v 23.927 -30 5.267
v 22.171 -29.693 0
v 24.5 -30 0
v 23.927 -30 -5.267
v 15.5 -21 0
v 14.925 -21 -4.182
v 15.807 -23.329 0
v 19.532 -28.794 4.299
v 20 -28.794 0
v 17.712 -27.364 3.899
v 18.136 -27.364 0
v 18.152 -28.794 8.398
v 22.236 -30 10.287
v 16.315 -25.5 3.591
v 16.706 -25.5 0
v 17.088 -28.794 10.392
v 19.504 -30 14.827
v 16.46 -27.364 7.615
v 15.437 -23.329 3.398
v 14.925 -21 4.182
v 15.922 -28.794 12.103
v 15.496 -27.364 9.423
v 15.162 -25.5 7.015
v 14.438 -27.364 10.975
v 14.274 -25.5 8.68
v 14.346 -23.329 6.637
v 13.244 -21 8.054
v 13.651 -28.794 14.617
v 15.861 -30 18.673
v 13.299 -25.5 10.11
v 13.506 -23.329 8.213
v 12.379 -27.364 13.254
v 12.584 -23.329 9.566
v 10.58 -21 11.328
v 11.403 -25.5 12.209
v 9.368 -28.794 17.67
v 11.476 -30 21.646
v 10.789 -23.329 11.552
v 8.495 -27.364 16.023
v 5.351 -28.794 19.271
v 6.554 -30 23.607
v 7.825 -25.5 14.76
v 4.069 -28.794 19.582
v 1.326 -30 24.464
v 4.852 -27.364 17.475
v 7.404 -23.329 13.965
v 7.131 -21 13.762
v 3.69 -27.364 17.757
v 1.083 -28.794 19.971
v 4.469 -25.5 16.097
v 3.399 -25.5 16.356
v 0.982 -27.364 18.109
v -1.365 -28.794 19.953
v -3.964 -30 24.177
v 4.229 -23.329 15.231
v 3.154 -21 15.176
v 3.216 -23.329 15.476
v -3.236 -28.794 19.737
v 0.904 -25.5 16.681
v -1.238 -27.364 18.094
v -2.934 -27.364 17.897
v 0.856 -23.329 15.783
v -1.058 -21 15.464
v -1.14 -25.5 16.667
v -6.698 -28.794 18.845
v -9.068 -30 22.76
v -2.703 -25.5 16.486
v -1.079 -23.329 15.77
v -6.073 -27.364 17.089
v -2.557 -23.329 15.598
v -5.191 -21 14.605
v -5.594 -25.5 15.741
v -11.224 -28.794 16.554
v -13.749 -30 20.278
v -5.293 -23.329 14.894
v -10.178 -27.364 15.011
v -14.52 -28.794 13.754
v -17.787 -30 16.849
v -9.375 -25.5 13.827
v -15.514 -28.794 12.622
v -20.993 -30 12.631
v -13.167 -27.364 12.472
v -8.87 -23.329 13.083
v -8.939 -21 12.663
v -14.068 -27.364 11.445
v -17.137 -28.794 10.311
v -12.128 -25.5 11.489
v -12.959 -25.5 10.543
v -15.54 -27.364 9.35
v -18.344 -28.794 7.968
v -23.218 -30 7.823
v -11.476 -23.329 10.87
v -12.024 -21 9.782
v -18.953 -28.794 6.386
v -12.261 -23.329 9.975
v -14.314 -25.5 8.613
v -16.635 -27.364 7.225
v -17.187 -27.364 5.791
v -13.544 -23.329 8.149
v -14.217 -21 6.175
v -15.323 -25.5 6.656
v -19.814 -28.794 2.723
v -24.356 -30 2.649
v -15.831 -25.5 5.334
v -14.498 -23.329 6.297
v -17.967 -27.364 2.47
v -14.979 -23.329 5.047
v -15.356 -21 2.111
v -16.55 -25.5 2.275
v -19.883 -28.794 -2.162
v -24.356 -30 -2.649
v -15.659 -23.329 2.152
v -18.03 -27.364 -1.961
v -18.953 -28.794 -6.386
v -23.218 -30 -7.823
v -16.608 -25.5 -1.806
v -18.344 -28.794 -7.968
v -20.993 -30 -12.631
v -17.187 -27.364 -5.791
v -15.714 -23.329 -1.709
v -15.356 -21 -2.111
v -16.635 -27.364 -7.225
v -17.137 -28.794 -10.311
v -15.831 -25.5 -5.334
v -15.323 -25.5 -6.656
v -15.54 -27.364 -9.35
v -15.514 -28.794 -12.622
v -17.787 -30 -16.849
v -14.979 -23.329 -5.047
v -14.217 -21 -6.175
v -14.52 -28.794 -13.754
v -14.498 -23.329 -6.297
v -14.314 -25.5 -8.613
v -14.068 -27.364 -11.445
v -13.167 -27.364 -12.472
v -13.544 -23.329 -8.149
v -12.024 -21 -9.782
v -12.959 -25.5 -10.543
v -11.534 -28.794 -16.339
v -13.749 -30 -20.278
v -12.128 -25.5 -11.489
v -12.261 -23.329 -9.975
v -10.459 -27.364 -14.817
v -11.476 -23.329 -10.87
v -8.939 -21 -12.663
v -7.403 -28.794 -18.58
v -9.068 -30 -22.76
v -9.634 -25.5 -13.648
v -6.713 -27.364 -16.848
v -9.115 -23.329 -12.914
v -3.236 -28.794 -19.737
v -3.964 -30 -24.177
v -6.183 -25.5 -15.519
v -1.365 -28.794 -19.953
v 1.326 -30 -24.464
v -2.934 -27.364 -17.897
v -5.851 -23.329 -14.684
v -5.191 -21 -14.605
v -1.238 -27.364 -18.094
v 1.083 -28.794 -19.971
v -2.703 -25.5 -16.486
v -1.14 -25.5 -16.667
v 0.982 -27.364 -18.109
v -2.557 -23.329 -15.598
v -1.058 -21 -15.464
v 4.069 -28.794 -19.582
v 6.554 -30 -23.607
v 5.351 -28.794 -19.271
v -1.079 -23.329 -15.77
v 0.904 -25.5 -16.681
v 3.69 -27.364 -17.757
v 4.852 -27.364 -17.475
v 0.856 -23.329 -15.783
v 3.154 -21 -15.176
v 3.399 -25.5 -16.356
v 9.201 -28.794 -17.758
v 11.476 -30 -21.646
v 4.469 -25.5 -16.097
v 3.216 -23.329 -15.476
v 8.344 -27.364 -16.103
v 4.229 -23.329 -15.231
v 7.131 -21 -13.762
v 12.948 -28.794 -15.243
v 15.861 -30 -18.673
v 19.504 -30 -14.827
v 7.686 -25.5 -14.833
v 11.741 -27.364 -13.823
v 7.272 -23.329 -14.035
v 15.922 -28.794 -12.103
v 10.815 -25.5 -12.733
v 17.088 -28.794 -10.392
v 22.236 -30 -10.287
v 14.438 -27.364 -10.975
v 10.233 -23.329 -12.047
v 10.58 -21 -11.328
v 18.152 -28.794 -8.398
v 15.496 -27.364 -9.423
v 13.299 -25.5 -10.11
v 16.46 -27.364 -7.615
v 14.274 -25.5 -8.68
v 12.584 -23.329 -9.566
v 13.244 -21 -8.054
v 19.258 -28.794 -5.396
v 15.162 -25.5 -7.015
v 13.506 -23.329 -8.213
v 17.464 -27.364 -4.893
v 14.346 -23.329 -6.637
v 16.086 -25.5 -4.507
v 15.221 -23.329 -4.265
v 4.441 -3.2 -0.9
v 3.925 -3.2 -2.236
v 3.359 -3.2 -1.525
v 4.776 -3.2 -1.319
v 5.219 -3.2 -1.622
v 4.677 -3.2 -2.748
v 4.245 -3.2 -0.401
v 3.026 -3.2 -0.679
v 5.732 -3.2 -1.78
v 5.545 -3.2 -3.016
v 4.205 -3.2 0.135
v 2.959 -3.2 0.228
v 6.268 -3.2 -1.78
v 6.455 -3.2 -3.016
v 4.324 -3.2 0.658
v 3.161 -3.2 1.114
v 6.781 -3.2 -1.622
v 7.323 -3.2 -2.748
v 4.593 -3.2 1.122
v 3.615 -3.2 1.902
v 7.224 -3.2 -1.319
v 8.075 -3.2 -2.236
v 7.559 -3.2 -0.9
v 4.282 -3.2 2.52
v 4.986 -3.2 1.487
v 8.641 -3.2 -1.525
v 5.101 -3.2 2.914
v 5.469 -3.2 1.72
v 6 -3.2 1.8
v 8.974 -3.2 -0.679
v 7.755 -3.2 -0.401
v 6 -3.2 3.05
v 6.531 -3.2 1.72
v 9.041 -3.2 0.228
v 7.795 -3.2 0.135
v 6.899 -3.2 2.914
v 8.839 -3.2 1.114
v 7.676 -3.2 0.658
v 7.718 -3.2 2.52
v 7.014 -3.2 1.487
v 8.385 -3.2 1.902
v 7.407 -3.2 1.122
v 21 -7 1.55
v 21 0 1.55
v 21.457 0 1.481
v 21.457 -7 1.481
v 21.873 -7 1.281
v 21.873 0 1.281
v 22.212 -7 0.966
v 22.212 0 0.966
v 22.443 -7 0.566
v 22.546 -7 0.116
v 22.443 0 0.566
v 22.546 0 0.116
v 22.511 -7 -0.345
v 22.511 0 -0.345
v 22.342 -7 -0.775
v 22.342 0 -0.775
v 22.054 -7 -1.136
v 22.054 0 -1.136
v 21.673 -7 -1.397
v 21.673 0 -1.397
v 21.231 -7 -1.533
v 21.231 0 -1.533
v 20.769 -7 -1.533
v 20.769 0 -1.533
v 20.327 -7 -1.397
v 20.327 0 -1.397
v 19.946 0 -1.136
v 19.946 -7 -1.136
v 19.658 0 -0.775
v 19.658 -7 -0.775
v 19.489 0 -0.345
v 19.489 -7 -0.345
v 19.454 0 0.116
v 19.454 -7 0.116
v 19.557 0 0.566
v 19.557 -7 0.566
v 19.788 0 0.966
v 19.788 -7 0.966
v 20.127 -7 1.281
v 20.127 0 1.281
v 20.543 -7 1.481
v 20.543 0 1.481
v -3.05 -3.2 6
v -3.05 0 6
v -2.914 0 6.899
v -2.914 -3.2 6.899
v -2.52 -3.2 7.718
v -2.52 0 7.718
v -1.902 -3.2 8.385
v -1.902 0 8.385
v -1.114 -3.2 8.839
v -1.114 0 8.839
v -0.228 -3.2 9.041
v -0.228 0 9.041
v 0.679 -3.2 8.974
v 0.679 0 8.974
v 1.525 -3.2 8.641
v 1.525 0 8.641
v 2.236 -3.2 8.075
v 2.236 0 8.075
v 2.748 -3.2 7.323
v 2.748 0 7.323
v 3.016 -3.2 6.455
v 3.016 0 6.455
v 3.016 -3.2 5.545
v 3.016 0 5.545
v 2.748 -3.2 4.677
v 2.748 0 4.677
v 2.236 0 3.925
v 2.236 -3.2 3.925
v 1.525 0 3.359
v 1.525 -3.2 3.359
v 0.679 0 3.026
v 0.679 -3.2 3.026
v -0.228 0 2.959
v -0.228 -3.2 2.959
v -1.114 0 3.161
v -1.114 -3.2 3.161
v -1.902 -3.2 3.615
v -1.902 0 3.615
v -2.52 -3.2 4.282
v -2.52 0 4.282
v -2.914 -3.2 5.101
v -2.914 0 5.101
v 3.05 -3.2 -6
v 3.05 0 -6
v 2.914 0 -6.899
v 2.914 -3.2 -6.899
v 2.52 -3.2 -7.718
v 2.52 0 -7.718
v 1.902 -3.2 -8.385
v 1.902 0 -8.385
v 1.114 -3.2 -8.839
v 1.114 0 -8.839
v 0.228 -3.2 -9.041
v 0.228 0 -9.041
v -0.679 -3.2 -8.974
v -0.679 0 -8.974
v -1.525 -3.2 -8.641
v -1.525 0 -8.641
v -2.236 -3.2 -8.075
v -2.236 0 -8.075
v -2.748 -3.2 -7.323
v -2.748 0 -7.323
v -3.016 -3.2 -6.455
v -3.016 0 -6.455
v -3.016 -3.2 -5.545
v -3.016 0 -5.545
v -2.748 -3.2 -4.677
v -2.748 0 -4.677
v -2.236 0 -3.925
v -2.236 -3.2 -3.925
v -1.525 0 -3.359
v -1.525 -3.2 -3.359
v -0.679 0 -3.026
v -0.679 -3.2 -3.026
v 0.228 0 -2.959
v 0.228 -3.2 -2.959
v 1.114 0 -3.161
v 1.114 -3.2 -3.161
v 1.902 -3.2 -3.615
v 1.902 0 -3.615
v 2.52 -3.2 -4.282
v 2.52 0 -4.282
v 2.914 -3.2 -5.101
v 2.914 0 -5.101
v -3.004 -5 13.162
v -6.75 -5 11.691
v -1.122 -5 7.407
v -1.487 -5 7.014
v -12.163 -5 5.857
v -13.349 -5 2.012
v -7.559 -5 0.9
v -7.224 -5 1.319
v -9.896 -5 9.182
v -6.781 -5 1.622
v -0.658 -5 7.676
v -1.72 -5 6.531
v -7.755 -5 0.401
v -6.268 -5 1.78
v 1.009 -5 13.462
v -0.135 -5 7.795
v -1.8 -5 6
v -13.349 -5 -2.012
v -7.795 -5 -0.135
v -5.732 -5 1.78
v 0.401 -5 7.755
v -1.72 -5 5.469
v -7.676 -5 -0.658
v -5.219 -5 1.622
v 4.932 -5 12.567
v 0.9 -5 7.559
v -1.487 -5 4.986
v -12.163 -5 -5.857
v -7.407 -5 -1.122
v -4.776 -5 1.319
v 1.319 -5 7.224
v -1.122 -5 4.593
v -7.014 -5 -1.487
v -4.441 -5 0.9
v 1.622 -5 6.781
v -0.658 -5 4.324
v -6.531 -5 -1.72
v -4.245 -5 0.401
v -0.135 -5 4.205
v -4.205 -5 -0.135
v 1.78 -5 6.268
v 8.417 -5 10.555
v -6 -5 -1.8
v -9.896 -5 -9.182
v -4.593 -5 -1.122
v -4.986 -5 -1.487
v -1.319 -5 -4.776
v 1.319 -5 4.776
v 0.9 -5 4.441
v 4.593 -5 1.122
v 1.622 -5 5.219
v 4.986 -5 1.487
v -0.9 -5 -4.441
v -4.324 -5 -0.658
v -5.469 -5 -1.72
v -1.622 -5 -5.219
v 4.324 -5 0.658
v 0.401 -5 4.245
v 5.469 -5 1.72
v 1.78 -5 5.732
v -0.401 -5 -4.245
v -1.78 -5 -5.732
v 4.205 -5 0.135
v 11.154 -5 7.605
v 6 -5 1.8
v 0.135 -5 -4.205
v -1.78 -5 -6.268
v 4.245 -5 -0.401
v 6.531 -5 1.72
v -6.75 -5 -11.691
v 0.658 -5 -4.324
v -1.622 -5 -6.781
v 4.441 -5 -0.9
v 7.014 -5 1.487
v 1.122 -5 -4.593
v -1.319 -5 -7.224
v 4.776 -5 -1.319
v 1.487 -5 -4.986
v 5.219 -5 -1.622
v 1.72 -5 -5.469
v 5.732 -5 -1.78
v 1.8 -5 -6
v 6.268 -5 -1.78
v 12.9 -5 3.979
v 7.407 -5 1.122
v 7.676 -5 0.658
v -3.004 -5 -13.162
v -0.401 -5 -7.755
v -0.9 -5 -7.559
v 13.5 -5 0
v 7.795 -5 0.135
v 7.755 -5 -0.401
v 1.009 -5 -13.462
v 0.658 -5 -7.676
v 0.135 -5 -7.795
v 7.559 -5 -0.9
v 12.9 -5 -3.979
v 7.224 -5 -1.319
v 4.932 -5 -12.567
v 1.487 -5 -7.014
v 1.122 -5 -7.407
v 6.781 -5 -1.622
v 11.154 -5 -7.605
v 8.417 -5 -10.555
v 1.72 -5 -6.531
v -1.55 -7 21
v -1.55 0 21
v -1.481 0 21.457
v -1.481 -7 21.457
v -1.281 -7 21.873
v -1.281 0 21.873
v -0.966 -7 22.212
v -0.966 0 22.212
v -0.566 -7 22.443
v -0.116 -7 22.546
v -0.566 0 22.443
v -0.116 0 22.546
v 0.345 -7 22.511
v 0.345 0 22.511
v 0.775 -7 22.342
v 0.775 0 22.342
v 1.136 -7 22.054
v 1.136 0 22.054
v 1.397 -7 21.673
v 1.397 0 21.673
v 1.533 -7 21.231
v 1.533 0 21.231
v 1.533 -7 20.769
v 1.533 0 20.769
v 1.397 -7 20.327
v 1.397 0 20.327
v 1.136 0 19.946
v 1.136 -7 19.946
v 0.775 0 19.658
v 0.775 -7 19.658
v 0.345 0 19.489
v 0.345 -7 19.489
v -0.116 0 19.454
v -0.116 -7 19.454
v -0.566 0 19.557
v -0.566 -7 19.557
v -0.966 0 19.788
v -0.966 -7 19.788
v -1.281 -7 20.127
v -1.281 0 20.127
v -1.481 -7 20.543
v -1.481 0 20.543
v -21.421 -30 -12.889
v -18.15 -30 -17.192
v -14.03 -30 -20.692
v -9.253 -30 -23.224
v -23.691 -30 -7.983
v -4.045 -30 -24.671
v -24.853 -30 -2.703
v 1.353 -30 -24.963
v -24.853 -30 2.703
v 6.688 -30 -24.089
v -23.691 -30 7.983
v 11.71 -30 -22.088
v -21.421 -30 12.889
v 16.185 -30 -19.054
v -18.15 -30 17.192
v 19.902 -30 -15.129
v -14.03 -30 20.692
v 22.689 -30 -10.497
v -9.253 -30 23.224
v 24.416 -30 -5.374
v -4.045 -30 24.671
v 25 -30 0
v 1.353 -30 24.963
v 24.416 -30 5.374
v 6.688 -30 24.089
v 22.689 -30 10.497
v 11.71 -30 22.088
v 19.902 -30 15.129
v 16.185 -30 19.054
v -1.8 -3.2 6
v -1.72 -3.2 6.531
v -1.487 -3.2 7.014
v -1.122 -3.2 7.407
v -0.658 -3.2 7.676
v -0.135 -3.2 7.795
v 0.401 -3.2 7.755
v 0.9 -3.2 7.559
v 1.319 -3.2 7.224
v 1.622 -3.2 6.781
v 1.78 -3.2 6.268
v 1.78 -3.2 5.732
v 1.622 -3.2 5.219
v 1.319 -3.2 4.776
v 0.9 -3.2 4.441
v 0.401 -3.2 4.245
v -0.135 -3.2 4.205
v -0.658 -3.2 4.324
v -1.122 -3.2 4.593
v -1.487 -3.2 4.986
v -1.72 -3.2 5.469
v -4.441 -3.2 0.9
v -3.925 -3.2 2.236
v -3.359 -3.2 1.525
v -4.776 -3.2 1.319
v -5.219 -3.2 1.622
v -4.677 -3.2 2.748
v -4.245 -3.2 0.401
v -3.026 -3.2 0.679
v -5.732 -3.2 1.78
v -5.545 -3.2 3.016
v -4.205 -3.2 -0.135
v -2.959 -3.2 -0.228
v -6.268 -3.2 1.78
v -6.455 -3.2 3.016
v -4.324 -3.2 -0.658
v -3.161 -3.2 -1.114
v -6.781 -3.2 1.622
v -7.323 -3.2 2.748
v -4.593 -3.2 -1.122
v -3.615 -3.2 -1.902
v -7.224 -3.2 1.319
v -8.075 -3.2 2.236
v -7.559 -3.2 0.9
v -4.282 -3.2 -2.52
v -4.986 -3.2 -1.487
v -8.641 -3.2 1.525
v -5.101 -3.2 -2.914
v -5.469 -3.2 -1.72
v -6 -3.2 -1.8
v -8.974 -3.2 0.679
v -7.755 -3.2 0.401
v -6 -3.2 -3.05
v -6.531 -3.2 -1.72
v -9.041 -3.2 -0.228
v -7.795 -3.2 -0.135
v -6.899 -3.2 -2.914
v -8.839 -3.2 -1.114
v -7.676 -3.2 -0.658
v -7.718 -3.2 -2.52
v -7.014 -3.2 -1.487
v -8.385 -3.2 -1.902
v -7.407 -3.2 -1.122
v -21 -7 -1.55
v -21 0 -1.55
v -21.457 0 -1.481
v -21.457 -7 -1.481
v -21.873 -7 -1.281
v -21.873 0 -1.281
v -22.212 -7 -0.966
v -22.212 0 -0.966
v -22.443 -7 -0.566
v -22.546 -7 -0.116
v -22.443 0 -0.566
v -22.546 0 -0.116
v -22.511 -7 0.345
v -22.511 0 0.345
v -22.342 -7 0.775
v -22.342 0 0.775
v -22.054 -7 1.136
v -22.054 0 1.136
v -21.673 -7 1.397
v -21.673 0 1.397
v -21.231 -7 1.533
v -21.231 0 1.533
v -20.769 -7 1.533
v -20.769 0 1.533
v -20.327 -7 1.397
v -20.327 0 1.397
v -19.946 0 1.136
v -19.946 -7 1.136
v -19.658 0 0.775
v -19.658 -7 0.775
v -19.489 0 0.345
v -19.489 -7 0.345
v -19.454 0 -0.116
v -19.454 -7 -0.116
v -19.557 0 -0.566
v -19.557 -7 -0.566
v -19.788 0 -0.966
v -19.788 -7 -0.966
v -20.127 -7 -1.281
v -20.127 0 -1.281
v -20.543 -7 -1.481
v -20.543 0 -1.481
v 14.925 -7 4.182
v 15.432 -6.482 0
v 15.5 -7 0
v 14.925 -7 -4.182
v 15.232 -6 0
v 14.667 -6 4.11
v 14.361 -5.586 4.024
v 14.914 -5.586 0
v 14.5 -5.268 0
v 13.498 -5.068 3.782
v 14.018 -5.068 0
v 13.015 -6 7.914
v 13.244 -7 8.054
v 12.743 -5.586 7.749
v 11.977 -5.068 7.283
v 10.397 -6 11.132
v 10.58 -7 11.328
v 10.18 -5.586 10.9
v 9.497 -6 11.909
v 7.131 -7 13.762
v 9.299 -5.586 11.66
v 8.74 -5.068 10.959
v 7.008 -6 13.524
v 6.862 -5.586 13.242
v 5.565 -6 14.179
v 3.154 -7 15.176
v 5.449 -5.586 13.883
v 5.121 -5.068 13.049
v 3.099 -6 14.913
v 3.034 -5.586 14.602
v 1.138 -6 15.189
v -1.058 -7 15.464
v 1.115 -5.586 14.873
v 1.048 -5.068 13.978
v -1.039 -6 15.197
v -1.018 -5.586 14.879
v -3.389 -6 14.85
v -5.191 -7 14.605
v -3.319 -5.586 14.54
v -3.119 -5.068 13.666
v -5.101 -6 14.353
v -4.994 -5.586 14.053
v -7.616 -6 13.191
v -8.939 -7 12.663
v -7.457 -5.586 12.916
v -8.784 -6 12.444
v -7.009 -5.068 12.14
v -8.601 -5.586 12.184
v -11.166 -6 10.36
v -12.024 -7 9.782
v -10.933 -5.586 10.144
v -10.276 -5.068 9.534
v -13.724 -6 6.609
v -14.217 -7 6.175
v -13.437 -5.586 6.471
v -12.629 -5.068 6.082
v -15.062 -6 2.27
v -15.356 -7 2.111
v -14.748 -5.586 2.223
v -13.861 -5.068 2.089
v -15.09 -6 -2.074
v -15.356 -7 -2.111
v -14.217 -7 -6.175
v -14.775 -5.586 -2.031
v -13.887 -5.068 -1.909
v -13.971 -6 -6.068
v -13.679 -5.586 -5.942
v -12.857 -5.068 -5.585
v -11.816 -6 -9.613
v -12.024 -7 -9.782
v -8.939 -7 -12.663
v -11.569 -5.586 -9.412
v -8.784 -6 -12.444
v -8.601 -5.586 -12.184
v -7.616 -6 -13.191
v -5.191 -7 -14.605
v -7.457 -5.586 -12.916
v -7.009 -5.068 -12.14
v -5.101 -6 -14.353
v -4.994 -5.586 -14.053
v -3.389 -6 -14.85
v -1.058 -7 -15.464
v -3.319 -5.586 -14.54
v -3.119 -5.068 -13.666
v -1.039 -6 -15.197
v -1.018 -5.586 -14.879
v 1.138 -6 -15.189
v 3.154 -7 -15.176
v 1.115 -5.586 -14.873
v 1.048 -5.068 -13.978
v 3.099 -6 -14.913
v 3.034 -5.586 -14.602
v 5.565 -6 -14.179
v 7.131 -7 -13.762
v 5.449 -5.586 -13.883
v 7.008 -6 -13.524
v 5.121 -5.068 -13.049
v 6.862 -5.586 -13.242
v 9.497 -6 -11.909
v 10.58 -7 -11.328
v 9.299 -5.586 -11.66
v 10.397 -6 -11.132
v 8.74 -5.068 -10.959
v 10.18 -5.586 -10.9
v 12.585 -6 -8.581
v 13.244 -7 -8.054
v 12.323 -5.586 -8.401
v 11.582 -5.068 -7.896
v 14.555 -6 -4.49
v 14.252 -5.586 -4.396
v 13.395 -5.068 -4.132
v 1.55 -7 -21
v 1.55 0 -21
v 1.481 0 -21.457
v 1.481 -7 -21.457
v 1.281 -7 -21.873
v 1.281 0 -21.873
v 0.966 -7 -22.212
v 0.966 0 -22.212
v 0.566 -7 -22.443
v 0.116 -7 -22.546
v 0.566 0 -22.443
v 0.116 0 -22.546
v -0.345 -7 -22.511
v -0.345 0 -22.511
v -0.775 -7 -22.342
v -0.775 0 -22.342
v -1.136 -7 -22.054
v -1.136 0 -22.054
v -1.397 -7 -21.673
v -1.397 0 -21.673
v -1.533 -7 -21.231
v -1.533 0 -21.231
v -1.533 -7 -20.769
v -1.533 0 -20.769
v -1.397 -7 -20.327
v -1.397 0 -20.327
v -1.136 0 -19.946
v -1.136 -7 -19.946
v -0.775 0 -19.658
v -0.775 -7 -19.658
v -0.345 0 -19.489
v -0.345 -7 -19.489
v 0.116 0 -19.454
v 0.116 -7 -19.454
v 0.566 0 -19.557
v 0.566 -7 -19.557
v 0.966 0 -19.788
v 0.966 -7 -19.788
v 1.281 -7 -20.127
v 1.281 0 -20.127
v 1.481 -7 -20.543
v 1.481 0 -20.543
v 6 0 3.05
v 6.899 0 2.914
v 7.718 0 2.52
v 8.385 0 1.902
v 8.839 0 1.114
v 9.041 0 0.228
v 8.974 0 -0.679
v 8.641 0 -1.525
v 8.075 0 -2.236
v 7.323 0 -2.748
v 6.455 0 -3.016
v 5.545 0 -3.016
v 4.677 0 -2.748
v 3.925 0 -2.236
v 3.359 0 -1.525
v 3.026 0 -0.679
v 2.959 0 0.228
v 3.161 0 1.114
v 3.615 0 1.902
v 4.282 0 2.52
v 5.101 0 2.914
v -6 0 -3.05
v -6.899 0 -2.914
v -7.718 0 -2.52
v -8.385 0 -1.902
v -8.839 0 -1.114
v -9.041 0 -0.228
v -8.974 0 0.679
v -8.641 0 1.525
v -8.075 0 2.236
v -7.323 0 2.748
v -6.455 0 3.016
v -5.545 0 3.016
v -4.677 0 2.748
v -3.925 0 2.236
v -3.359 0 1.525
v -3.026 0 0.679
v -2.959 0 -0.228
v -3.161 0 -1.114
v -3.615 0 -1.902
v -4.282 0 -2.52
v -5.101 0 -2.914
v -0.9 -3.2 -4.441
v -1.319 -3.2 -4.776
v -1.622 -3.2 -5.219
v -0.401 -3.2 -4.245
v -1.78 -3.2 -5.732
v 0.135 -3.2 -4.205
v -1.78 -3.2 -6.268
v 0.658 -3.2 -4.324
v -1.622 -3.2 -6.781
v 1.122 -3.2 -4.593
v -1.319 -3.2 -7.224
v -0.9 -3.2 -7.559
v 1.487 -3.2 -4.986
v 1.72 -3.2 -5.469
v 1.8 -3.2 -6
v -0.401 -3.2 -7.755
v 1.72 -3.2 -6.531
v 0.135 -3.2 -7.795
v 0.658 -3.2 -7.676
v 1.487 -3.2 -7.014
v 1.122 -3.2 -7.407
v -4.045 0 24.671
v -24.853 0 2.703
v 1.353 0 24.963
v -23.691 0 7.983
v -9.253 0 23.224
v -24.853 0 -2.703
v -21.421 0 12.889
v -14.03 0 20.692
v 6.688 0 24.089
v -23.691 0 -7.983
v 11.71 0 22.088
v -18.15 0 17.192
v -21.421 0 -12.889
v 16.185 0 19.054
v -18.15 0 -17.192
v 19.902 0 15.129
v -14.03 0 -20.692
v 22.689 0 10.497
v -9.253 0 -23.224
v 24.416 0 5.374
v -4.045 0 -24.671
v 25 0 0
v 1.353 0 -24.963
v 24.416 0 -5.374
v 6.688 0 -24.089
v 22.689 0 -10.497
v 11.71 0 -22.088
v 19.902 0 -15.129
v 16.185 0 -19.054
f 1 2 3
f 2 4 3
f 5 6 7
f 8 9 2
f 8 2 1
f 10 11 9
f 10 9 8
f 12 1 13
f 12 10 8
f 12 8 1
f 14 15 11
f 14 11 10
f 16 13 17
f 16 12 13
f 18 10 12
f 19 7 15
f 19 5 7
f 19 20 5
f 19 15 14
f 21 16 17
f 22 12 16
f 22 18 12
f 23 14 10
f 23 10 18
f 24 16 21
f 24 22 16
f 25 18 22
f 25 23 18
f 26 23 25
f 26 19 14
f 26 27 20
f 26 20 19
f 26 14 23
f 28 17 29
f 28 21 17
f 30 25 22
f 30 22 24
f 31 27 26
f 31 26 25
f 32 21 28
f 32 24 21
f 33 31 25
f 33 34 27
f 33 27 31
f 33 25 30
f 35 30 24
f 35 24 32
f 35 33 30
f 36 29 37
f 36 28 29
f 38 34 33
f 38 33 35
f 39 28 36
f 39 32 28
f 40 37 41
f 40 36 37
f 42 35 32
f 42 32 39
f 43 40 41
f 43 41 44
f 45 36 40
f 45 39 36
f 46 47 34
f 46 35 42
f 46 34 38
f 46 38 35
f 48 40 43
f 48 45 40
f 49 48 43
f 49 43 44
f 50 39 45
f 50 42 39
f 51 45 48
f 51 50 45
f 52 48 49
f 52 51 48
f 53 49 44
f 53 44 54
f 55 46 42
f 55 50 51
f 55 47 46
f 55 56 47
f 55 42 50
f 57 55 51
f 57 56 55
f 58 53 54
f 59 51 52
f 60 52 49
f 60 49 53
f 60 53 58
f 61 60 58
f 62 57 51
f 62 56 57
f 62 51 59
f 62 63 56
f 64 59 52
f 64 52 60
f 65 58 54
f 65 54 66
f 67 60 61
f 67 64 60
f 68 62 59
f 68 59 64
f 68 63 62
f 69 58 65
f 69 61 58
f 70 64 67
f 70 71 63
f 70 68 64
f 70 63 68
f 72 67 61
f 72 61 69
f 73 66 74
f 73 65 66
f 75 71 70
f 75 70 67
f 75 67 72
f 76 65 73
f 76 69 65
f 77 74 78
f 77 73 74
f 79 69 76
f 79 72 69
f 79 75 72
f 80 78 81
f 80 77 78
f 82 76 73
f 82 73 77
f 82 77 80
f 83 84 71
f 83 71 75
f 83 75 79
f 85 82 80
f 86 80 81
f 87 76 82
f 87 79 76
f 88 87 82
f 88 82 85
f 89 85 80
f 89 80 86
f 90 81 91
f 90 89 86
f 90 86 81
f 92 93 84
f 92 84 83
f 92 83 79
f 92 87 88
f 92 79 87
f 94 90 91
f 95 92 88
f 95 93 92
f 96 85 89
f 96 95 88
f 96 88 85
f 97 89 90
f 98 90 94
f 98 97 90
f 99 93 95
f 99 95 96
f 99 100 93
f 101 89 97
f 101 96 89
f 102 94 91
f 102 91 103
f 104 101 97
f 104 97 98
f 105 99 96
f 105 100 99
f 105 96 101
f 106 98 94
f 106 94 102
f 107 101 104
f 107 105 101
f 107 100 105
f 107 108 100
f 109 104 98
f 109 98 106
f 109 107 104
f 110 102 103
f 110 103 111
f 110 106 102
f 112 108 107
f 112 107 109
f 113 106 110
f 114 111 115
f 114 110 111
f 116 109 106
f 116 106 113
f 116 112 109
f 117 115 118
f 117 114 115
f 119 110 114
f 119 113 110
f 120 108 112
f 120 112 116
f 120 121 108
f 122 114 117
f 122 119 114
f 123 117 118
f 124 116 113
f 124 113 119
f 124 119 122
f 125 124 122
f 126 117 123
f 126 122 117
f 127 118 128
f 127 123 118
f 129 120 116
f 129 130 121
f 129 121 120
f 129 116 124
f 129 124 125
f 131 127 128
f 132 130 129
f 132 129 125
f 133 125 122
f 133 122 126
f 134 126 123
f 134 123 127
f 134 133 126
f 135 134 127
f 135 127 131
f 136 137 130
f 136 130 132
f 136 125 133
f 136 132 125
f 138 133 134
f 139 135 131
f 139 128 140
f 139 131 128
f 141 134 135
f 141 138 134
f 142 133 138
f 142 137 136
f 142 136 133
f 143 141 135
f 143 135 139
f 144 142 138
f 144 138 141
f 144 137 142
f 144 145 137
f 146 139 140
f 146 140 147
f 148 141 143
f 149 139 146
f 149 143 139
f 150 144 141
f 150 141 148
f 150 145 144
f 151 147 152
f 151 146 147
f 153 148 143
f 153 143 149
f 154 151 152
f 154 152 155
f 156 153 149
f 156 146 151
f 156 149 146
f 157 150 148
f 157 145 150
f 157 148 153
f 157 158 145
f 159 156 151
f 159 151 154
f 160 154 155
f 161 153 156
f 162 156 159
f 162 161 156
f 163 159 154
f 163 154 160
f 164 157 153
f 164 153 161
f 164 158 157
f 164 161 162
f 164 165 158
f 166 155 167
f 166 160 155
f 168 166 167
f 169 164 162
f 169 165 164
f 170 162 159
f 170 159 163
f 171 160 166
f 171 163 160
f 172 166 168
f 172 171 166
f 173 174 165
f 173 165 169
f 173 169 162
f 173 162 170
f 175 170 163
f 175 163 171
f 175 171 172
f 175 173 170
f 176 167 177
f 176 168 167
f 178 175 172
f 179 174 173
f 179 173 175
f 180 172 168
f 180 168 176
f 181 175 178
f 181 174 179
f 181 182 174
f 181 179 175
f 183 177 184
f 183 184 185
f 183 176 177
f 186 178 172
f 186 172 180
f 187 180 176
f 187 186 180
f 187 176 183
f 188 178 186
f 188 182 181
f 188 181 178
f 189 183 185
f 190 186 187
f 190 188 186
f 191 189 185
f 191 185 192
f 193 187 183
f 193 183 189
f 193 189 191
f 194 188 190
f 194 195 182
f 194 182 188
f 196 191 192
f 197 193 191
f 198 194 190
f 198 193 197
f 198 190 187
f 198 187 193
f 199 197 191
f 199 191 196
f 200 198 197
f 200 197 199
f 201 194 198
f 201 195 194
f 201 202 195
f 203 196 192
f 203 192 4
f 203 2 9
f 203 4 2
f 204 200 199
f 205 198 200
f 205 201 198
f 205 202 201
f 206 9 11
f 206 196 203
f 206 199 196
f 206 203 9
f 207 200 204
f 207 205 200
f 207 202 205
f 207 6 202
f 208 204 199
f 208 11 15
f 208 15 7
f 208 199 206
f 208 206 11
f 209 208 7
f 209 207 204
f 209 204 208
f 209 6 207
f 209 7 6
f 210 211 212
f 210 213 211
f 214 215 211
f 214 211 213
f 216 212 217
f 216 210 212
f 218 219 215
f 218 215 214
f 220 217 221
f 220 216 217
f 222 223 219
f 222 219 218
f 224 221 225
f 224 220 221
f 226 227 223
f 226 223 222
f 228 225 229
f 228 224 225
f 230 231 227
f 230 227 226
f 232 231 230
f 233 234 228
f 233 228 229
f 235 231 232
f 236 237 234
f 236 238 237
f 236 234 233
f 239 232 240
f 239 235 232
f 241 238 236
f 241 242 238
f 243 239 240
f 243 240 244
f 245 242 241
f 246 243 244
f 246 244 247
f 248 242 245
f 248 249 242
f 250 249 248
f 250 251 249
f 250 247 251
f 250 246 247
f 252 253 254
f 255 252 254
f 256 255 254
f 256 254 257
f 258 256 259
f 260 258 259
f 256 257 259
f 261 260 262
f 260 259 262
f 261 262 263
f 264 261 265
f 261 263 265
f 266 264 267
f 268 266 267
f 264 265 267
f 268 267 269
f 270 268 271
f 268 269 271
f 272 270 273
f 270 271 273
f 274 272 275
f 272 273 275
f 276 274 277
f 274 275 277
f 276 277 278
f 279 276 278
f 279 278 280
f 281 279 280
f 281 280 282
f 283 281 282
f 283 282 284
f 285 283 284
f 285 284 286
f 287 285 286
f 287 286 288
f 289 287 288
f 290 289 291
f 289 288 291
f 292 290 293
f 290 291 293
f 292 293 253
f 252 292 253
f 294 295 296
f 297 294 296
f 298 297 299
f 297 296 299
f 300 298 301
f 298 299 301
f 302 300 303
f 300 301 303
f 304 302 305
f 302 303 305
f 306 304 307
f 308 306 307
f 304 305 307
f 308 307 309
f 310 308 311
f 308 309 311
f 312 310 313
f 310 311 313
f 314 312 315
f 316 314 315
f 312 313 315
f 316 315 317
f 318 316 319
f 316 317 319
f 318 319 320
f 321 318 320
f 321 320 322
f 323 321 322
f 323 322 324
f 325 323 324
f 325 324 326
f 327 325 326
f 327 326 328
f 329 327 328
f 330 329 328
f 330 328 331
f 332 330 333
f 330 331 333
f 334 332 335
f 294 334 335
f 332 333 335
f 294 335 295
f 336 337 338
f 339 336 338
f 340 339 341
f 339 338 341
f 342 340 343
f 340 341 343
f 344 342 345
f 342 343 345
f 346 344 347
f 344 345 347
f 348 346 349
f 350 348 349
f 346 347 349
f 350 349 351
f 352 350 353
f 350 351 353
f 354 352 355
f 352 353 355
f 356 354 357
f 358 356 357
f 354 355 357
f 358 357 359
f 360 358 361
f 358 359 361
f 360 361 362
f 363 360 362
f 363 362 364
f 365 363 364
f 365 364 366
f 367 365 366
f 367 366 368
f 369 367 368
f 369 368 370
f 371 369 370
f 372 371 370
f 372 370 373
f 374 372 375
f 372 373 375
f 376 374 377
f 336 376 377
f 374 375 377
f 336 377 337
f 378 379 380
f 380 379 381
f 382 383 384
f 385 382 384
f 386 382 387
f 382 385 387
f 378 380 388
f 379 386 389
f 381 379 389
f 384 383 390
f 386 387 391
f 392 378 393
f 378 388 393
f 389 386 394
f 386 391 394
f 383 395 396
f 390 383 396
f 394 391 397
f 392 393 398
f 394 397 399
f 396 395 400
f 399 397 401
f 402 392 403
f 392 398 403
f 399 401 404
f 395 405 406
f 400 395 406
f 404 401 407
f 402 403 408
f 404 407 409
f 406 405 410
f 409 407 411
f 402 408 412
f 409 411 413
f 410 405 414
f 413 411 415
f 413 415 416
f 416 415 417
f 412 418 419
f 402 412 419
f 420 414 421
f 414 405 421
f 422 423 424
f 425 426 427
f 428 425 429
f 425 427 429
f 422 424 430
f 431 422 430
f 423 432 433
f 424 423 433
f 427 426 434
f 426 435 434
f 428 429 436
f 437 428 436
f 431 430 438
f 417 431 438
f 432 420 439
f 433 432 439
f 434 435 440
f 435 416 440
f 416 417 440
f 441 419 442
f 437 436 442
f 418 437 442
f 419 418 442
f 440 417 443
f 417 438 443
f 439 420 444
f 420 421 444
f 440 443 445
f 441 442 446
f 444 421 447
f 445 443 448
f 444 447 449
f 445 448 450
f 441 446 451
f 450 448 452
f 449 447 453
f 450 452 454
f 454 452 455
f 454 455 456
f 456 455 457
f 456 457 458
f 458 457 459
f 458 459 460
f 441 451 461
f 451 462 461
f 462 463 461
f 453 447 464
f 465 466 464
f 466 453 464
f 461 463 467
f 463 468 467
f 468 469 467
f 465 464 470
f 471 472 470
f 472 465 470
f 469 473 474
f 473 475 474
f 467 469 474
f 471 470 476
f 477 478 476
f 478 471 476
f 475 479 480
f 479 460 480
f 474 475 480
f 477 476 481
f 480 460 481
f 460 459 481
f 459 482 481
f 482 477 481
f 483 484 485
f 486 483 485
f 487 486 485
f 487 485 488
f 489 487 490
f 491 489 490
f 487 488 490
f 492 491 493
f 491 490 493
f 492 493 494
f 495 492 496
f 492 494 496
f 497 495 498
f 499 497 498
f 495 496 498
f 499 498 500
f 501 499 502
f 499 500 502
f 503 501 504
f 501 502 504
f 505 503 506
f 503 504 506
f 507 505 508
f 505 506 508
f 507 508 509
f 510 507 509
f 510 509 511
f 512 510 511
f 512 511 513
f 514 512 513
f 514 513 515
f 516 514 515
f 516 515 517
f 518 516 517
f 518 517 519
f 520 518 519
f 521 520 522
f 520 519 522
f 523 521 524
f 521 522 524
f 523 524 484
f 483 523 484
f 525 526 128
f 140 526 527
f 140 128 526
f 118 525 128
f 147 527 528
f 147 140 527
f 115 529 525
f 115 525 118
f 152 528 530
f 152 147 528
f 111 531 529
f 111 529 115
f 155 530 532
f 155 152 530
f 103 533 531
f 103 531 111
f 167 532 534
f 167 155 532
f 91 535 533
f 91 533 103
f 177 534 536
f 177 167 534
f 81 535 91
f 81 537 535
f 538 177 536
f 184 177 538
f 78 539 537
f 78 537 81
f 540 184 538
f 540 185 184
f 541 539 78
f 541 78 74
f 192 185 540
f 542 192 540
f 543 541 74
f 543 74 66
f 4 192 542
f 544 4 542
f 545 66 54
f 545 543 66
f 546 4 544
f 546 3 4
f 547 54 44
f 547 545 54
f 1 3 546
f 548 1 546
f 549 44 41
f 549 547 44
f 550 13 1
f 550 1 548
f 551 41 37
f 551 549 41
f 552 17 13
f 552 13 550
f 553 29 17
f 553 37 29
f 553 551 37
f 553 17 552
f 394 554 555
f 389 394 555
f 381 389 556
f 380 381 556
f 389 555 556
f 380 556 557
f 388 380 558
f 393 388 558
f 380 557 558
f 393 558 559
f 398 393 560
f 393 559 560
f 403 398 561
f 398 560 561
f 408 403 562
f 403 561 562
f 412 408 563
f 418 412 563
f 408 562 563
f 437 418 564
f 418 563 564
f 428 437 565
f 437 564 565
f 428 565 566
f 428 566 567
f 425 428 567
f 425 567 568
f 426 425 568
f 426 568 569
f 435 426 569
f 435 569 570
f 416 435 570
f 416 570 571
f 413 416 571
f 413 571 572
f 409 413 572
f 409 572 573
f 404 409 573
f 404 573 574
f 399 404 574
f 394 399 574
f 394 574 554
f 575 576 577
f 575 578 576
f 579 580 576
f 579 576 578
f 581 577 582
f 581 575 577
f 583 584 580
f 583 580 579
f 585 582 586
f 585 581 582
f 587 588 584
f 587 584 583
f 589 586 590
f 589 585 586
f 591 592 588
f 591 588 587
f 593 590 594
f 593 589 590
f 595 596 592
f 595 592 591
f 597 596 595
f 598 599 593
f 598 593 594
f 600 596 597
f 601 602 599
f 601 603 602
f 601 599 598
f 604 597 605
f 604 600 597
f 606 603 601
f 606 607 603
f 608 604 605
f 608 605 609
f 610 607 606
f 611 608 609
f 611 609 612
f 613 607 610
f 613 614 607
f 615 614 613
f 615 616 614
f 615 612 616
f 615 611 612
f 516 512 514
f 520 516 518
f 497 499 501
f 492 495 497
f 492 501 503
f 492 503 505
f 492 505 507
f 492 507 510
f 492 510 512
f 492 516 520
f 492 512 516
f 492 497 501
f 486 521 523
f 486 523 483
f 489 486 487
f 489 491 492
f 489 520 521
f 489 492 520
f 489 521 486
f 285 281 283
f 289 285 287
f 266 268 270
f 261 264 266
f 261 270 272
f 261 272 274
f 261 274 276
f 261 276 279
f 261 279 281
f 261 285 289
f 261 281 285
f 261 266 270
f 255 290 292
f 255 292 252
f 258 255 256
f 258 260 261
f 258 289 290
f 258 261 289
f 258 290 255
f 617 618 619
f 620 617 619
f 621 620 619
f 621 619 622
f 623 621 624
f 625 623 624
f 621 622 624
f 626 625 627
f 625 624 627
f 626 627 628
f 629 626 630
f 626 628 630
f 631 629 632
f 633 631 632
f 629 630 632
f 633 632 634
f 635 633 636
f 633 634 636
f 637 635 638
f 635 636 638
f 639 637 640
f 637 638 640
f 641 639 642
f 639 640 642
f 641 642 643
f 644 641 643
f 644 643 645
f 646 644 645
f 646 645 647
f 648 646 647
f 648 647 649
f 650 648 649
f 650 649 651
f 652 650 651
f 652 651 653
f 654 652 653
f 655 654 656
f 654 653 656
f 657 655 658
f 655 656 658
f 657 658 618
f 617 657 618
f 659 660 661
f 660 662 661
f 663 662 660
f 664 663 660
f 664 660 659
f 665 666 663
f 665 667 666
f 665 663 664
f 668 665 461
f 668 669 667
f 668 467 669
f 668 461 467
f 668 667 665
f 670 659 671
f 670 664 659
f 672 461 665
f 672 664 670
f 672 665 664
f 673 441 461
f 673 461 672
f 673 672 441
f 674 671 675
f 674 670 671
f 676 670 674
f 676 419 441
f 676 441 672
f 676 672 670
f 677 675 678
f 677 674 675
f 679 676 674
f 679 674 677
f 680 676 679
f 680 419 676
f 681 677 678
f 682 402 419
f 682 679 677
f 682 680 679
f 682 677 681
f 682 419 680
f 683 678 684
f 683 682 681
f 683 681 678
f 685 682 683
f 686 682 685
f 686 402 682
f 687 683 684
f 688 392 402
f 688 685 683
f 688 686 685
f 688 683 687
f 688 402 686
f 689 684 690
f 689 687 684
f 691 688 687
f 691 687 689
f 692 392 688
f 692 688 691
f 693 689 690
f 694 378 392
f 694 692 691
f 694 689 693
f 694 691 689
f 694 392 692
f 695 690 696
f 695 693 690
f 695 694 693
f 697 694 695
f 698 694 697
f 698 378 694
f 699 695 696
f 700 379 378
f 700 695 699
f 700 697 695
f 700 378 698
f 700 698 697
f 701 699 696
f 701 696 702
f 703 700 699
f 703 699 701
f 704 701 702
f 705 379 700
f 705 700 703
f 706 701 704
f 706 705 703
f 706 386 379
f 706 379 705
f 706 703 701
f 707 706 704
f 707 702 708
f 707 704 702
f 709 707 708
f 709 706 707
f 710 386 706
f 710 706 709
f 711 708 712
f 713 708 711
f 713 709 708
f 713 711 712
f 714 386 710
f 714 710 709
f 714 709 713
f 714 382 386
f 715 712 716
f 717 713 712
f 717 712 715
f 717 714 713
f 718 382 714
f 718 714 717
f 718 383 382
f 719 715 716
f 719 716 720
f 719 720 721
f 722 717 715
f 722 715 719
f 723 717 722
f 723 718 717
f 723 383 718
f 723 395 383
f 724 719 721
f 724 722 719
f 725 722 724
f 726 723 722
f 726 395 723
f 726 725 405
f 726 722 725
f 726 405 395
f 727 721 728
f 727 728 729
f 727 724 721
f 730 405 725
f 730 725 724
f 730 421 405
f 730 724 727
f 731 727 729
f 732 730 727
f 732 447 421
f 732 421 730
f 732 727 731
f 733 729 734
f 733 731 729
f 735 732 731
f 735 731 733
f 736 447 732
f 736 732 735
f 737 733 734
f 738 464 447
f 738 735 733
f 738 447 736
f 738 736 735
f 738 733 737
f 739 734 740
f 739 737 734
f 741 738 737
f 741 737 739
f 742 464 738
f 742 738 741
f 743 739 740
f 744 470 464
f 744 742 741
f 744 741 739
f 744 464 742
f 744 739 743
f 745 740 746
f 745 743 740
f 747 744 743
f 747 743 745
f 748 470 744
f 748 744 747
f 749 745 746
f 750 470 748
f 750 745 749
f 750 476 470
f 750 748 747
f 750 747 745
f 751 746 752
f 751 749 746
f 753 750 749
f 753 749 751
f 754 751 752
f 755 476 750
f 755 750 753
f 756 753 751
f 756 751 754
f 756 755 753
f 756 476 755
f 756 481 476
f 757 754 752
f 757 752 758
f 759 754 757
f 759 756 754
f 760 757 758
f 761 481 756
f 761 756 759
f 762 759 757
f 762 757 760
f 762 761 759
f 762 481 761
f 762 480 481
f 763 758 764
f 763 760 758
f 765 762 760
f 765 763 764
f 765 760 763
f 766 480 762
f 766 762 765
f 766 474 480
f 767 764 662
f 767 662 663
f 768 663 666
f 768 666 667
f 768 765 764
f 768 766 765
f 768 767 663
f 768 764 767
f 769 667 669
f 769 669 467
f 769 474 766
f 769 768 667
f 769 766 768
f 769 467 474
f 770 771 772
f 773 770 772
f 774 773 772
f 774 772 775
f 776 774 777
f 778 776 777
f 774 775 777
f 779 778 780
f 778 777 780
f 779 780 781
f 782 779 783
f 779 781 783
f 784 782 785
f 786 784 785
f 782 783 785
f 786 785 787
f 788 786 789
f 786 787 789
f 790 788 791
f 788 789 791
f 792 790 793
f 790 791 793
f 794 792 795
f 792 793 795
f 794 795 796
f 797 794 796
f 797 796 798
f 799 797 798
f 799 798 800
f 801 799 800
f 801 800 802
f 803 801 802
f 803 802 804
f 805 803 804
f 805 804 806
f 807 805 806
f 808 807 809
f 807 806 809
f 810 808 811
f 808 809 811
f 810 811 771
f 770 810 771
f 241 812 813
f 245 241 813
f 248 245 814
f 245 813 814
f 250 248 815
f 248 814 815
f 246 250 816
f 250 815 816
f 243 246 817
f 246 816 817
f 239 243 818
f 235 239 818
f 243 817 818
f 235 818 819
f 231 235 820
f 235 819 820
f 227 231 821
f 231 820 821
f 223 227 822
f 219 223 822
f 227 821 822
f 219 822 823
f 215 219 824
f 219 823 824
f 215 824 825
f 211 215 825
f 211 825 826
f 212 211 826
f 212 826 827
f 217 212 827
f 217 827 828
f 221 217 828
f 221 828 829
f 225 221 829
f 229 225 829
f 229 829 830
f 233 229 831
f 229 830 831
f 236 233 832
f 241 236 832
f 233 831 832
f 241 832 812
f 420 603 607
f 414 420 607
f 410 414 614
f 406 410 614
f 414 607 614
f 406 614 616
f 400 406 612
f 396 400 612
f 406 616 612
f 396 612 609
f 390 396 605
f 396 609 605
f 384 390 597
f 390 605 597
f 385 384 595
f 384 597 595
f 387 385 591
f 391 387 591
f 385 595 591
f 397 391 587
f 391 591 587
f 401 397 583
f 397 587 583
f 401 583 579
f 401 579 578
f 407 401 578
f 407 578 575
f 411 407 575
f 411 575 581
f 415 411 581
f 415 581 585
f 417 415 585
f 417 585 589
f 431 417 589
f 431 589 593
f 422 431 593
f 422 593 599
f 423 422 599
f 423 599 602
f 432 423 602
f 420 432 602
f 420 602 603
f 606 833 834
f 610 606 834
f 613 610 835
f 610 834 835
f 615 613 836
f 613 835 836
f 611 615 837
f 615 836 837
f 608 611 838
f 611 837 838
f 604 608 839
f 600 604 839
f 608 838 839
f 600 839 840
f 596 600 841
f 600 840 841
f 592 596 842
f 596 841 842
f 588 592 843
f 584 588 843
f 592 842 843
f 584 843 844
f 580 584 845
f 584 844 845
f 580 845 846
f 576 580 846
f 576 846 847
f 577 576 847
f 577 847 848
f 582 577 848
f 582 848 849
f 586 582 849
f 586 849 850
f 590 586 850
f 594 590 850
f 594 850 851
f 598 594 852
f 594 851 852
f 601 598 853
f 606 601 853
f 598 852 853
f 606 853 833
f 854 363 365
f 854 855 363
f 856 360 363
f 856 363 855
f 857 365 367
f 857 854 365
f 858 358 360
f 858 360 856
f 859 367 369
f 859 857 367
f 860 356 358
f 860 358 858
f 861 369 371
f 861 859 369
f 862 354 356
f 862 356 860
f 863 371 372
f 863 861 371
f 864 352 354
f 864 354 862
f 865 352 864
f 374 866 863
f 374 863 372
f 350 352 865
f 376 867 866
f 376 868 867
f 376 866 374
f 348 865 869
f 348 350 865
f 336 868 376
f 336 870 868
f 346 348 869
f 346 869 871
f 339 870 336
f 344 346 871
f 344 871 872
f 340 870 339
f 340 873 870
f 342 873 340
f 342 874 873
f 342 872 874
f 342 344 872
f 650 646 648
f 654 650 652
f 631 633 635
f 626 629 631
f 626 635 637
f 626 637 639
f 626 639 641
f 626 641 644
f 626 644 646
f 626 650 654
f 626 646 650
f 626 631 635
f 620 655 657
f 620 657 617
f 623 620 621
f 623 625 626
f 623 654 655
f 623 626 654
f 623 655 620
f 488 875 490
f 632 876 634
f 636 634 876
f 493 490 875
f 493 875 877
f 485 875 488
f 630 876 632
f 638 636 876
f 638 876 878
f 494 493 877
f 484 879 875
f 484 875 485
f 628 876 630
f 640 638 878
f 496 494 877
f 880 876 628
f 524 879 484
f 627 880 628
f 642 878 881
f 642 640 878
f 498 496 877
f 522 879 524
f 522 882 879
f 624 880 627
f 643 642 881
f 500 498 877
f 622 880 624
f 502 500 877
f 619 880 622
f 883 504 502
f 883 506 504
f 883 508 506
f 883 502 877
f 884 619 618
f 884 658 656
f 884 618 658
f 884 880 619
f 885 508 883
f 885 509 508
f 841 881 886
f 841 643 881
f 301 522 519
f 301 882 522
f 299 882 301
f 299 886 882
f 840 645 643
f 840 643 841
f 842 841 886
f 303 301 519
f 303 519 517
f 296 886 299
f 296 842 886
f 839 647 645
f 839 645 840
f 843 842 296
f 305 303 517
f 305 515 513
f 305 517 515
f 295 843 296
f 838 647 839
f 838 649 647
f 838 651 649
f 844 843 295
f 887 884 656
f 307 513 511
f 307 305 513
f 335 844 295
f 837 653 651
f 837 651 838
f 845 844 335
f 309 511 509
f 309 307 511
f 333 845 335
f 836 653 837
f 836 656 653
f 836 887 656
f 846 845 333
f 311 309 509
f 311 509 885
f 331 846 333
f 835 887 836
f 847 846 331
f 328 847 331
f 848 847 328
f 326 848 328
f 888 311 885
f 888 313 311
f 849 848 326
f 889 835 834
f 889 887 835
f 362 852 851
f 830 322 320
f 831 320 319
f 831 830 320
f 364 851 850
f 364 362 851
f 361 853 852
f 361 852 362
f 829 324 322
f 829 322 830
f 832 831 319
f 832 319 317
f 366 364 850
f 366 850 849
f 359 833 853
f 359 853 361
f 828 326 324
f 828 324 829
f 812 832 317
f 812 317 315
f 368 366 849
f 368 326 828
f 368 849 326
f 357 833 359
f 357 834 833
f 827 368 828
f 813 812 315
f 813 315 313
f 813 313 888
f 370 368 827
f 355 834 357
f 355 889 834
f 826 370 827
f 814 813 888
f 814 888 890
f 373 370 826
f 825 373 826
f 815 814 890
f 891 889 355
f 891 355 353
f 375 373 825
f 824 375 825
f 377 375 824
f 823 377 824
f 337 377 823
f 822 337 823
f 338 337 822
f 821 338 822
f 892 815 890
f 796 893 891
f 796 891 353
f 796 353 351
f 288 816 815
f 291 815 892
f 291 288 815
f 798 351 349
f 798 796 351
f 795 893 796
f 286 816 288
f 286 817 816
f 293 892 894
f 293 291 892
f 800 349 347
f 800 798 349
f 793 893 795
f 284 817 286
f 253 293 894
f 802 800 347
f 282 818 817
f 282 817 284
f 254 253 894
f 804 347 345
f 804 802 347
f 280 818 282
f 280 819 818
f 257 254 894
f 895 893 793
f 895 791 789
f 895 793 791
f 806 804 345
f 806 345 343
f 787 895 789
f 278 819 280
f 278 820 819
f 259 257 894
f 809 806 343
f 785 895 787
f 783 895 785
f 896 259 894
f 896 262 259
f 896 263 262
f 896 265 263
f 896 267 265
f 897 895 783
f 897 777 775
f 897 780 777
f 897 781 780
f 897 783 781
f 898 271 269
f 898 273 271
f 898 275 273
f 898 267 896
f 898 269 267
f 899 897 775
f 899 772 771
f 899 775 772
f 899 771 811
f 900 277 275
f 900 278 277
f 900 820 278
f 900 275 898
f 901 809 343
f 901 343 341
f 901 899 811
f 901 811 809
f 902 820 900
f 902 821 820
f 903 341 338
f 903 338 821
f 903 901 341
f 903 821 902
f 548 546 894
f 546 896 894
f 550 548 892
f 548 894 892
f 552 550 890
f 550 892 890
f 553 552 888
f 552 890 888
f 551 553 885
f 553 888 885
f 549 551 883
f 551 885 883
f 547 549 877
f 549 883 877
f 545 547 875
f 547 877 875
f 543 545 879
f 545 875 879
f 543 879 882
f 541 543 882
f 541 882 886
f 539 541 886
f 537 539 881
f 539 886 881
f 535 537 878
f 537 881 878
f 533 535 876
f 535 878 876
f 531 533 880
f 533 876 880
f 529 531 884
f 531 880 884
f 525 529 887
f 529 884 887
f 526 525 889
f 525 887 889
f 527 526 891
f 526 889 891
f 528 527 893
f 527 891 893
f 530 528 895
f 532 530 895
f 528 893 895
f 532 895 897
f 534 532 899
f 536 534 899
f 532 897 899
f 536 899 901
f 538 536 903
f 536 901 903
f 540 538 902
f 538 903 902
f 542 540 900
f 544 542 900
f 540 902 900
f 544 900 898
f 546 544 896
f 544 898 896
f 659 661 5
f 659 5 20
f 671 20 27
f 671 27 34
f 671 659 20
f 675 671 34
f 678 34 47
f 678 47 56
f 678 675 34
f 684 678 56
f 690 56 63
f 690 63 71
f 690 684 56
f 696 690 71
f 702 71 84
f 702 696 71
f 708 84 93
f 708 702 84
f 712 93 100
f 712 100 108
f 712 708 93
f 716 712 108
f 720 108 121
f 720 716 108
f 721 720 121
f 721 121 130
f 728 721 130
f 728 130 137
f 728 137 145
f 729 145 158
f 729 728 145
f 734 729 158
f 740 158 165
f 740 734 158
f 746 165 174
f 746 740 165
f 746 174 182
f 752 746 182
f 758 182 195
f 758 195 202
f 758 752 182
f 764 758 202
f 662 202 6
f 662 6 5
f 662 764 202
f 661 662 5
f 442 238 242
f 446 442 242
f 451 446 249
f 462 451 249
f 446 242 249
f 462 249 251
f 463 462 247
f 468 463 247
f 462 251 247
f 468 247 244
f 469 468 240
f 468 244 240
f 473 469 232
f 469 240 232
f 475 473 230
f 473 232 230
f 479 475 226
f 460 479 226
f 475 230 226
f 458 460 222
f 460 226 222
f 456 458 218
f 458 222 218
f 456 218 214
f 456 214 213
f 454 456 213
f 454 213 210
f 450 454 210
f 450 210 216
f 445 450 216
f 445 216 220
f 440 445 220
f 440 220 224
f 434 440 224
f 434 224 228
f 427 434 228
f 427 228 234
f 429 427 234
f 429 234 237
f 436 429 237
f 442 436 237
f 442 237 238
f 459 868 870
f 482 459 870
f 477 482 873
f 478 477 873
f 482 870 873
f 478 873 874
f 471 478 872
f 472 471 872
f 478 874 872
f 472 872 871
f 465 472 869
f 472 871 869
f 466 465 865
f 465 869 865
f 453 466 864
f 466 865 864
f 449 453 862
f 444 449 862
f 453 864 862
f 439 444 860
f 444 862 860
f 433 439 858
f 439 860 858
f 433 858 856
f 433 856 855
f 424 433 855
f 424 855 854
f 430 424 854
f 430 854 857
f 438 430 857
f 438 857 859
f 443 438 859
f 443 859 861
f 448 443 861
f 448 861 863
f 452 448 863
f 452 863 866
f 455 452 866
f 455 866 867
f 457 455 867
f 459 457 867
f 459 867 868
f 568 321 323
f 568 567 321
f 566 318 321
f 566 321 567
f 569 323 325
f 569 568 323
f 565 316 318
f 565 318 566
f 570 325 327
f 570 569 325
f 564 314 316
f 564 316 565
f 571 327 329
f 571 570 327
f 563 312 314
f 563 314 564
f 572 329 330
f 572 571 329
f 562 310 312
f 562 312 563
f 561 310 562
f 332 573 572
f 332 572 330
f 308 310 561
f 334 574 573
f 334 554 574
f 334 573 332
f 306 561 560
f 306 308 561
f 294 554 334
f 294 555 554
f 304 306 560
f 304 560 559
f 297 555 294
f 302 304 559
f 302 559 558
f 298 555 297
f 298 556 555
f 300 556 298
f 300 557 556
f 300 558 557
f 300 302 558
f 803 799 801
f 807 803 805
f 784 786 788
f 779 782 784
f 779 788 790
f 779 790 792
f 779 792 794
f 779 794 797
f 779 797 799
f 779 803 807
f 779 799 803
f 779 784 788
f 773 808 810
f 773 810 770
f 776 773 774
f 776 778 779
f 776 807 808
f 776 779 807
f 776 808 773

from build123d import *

# Parameters (mm, degrees)
SKETCH1_R           = 25
BOSS_EXTRUDE1_DEPTH = 5
SKETCH2_R           = 25
SKETCH2_R_2         = 15.5
BOSS_EXTRUDE2_DEPTH = 25
SKETCH3_R           = 3.05
SKETCH3_R_2         = 1.8
CUT_EXTRUDE1_DEPTH  = 3.2
CUT_EXTRUDE2_REACH  = 48.368
SKETCH3_2_R         = 1.8
SKETCH4_R           = 1.55
CUT_EXTRUDE4_DEPTH  = 7
CIRPATTERN1_COUNT   = 4
FILLET1_R           = 9
FILLET2_R           = 2


with BuildPart() as part:
    # Sketch1 → Boss-Extrude1 (new body)
    with BuildSketch(Plane(origin=(0, 0, 0), x_dir=(1, 0, 0), z_dir=(0, 1, 0))):
        Circle(SKETCH1_R)
    extrude(amount=-BOSS_EXTRUDE1_DEPTH)

    # Sketch2 → Boss-Extrude2 (add)
    with BuildSketch(Plane.XZ.offset(5)):
        Circle(SKETCH2_R)
        Circle(SKETCH2_R_2, mode=Mode.SUBTRACT)
    extrude(amount=BOSS_EXTRUDE2_DEPTH)

    # Sketch3 → Cut-Extrude1 (cut)
    with BuildSketch(Plane(origin=(0, 0, 0), x_dir=(1, 0, 0), z_dir=(0, 1, 0))):
        with Locations((0, 6)):
            Circle(SKETCH3_R)
        with Locations((0, 6)):
            Circle(SKETCH3_R_2, mode=Mode.SUBTRACT)
    cut_extrude1 = extrude(amount=-CUT_EXTRUDE1_DEPTH, mode=Mode.SUBTRACT)

    # Sketch3<2> → Cut-Extrude2 (cut, up to next)
    with BuildSketch(Plane(origin=(0, 0, 0), x_dir=(1, 0, 0), z_dir=(0, 1, 0)), mode=Mode.PRIVATE) as cut_extrude2_sk1:
        with Locations((0, 6)):
            Circle(SKETCH3_2_R)
    cut_extrude2_tool1 = extrude(cut_extrude2_sk1.sketch, amount=-CUT_EXTRUDE2_REACH, mode=Mode.PRIVATE) & part.part
    cut_extrude2 = cut_extrude2_tool1.solids().sort_by_distance((0, 0, -6))[0]
    add(cut_extrude2, mode=Mode.SUBTRACT)

    # Sketch4 → Cut-Extrude4 (cut)
    with BuildSketch(Plane(origin=(0, 0, 0), x_dir=(1, 0, 0), z_dir=(0, 1, 0))):
        with Locations((0, 21)):
            Circle(SKETCH4_R)
    cut_extrude4 = extrude(amount=-CUT_EXTRUDE4_DEPTH, mode=Mode.SUBTRACT)

    # CirPattern1: Cut-Extrude1, Cut-Extrude2, Cut-Extrude4 ×4 about axis
    cirpattern1_axis = Axis((0, -5, 0), (0, 1, 0))
    add([cut_extrude1.rotate(cirpattern1_axis, i * 360 / CIRPATTERN1_COUNT) for i in range(1, CIRPATTERN1_COUNT)], mode=Mode.SUBTRACT)
    add([cut_extrude2.rotate(cirpattern1_axis, i * 360 / CIRPATTERN1_COUNT) for i in range(1, CIRPATTERN1_COUNT)], mode=Mode.SUBTRACT)
    add([cut_extrude4.rotate(cirpattern1_axis, i * 360 / CIRPATTERN1_COUNT) for i in range(1, CIRPATTERN1_COUNT)], mode=Mode.SUBTRACT)

    # Fillet1
    fillet1_edges = [part.edges().sort_by_distance(p)[0] for p in [
        (-15.5, -30, 0),
    ]]
    fillet(fillet1_edges, radius=FILLET1_R)

    # Fillet2
    fillet2_edges = [part.edges().sort_by_distance(p)[0] for p in [
        (-15.5, -5, 0),
    ]]
    fillet(fillet2_edges, radius=FILLET2_R)


solid = part.part
